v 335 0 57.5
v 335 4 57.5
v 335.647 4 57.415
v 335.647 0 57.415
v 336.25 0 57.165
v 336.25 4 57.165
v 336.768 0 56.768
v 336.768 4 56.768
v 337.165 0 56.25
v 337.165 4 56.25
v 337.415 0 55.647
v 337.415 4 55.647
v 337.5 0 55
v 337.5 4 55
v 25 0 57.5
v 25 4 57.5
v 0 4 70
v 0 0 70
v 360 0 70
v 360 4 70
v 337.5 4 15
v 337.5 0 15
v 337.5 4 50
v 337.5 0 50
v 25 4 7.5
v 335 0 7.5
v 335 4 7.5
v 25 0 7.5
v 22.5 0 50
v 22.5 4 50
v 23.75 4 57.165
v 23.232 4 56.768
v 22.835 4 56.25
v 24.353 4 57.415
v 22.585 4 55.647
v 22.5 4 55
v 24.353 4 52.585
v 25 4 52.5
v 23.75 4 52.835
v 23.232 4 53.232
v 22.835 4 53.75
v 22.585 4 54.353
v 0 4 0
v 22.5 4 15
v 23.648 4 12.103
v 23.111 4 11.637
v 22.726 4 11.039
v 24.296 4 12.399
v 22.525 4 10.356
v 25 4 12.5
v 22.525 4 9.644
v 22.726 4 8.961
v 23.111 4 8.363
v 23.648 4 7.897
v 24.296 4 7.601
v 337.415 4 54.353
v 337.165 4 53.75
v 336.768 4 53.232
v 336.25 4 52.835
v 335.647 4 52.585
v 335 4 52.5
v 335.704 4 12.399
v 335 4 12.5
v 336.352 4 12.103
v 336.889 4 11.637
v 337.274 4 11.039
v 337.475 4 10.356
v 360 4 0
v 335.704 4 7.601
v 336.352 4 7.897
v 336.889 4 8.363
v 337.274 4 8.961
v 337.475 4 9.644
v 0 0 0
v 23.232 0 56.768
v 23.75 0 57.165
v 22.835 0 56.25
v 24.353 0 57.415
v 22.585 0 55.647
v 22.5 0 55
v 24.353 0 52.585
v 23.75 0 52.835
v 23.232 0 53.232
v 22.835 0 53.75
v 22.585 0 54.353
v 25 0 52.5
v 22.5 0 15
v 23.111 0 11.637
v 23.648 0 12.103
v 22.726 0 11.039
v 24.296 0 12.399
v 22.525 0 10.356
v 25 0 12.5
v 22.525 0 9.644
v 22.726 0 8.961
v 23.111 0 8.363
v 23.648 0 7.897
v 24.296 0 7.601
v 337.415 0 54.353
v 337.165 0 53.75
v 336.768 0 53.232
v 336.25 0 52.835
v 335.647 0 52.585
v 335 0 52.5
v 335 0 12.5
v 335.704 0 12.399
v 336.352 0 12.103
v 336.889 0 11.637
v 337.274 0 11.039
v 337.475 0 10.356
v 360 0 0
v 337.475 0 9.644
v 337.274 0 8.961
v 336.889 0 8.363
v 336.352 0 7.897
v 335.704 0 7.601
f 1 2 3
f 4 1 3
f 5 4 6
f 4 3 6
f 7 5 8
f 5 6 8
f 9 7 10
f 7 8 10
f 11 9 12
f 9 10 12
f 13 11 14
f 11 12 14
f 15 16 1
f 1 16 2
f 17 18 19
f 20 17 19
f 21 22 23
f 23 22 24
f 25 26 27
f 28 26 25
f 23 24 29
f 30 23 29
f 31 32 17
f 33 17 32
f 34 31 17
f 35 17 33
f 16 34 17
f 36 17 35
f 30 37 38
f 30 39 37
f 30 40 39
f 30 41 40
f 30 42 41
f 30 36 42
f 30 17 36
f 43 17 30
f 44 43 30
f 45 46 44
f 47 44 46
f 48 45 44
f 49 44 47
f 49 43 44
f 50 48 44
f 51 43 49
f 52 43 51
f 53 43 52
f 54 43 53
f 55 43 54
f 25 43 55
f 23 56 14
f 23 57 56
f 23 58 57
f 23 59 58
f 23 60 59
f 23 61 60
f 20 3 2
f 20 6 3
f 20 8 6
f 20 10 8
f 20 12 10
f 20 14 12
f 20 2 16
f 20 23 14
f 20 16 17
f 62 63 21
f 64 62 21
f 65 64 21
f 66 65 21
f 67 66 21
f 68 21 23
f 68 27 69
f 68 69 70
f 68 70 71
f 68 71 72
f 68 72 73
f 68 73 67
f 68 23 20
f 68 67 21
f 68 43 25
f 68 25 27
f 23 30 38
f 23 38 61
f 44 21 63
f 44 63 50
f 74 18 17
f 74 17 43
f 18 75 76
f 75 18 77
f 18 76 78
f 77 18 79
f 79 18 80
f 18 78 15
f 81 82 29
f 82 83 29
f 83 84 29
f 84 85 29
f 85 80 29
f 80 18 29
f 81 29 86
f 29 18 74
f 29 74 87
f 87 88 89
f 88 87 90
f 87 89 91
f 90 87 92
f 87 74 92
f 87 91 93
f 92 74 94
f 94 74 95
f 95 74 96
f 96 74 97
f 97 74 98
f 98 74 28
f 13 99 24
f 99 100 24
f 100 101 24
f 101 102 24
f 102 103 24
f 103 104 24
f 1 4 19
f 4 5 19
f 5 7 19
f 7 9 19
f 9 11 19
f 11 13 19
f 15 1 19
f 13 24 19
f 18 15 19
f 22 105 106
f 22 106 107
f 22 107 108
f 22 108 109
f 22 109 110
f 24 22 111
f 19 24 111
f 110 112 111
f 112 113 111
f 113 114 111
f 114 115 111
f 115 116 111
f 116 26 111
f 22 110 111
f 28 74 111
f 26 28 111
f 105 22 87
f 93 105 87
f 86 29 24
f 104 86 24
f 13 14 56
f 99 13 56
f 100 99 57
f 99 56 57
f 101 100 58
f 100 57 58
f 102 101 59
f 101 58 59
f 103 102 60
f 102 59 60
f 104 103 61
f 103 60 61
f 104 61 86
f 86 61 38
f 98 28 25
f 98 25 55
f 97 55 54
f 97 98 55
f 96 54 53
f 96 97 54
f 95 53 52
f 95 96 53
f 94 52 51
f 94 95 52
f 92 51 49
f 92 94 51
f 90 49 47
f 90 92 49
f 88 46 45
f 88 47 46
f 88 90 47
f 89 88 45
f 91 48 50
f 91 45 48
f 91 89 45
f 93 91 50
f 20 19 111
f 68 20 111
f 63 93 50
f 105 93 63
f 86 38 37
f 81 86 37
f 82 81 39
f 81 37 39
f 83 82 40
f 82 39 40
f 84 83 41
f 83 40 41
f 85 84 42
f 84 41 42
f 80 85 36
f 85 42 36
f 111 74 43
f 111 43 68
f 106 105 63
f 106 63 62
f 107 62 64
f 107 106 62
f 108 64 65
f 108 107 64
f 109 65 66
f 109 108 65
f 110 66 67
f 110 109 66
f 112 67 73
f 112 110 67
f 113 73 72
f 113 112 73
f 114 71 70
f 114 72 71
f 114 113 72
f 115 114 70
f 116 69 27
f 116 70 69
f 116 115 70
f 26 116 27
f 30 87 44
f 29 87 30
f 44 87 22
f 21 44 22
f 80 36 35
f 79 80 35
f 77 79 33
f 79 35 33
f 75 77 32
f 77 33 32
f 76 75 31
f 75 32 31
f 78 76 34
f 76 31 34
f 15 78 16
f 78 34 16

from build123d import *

# Parameters (mm, degrees)
SKETCH_1_W          = 360
SKETCH_1_H          = 70
EXTRUDE_1_DEPTH     = 4
CUT_EXTRUDE_1_DEPTH = 367.764229444
CUT_EXTRUDE_2_DEPTH = 367.764229444
SKETCH_4_W          = 310
SKETCH_4_H          = 35
SKETCH_4_W_2        = 2.5
CUT_EXTRUDE_3_DEPTH = 367.764229444


with BuildPart() as part:
    # 草图1 → 凸台-拉伸1 (new body)
    with BuildSketch(Plane(origin=(0, 0, 0), x_dir=(1, 0, 0), z_dir=(0, 1, 0))):
        with Locations((180, -35)):
            Rectangle(SKETCH_1_W, SKETCH_1_H)
    extrude(amount=EXTRUDE_1_DEPTH)

    # 草图2 → 切除-拉伸1 (cut, through all)
    with BuildSketch(Plane(origin=(0, 4, 0), x_dir=(1, 0, 0), z_dir=(0, 1, 0))):
        with BuildLine():
            Line((22.5, -55), (25, -55))
            Line((25, -55), (335, -55))
            Line((335, -55), (337.5, -55))
            ThreePointArc((337.5, -55), (336.767766953, -53.232233047), (335, -52.5))
            Line((335, -52.5), (25, -52.5))
            ThreePointArc((25, -52.5), (23.232233047, -53.232233047), (22.5, -55))
        make_face()
        with BuildLine():
            Line((335, -55), (25, -55))
            Line((25, -55), (22.5, -55))
            ThreePointArc((22.5, -55), (23.232233047, -56.767766953), (25, -57.5))
            Line((25, -57.5), (335, -57.5))
            ThreePointArc((335, -57.5), (336.767766953, -56.767766953), (337.5, -55))
            Line((337.5, -55), (335, -55))
        make_face()
    extrude(amount=-CUT_EXTRUDE_1_DEPTH, mode=Mode.SUBTRACT)

    # 草图3 → 切除-拉伸2 (cut, through all)
    with BuildSketch(Plane.XZ):
        with BuildLine():
            Line((25, 12.5), (335, 12.5))
            ThreePointArc((335, 12.5), (337.5, 10), (335, 7.5))
            Line((335, 7.5), (25, 7.5))
            ThreePointArc((25, 7.5), (22.5, 10), (25, 12.5))
        make_face()
    extrude(amount=-CUT_EXTRUDE_2_DEPTH, mode=Mode.SUBTRACT)

    # 草图4 → 切除-拉伸3 (cut, through all)
    with BuildSketch(Plane.XZ):
        with Locations((180, 32.5)):
            Rectangle(SKETCH_4_W, SKETCH_4_H)
        with Locations((23.75, 32.5)):
            Rectangle(SKETCH_4_W_2, SKETCH_4_H)
        with Locations((336.25, 32.5)):
            Rectangle(SKETCH_4_W_2, SKETCH_4_H)
    extrude(amount=-CUT_EXTRUDE_3_DEPTH, mode=Mode.SUBTRACT)


solid = part.part
